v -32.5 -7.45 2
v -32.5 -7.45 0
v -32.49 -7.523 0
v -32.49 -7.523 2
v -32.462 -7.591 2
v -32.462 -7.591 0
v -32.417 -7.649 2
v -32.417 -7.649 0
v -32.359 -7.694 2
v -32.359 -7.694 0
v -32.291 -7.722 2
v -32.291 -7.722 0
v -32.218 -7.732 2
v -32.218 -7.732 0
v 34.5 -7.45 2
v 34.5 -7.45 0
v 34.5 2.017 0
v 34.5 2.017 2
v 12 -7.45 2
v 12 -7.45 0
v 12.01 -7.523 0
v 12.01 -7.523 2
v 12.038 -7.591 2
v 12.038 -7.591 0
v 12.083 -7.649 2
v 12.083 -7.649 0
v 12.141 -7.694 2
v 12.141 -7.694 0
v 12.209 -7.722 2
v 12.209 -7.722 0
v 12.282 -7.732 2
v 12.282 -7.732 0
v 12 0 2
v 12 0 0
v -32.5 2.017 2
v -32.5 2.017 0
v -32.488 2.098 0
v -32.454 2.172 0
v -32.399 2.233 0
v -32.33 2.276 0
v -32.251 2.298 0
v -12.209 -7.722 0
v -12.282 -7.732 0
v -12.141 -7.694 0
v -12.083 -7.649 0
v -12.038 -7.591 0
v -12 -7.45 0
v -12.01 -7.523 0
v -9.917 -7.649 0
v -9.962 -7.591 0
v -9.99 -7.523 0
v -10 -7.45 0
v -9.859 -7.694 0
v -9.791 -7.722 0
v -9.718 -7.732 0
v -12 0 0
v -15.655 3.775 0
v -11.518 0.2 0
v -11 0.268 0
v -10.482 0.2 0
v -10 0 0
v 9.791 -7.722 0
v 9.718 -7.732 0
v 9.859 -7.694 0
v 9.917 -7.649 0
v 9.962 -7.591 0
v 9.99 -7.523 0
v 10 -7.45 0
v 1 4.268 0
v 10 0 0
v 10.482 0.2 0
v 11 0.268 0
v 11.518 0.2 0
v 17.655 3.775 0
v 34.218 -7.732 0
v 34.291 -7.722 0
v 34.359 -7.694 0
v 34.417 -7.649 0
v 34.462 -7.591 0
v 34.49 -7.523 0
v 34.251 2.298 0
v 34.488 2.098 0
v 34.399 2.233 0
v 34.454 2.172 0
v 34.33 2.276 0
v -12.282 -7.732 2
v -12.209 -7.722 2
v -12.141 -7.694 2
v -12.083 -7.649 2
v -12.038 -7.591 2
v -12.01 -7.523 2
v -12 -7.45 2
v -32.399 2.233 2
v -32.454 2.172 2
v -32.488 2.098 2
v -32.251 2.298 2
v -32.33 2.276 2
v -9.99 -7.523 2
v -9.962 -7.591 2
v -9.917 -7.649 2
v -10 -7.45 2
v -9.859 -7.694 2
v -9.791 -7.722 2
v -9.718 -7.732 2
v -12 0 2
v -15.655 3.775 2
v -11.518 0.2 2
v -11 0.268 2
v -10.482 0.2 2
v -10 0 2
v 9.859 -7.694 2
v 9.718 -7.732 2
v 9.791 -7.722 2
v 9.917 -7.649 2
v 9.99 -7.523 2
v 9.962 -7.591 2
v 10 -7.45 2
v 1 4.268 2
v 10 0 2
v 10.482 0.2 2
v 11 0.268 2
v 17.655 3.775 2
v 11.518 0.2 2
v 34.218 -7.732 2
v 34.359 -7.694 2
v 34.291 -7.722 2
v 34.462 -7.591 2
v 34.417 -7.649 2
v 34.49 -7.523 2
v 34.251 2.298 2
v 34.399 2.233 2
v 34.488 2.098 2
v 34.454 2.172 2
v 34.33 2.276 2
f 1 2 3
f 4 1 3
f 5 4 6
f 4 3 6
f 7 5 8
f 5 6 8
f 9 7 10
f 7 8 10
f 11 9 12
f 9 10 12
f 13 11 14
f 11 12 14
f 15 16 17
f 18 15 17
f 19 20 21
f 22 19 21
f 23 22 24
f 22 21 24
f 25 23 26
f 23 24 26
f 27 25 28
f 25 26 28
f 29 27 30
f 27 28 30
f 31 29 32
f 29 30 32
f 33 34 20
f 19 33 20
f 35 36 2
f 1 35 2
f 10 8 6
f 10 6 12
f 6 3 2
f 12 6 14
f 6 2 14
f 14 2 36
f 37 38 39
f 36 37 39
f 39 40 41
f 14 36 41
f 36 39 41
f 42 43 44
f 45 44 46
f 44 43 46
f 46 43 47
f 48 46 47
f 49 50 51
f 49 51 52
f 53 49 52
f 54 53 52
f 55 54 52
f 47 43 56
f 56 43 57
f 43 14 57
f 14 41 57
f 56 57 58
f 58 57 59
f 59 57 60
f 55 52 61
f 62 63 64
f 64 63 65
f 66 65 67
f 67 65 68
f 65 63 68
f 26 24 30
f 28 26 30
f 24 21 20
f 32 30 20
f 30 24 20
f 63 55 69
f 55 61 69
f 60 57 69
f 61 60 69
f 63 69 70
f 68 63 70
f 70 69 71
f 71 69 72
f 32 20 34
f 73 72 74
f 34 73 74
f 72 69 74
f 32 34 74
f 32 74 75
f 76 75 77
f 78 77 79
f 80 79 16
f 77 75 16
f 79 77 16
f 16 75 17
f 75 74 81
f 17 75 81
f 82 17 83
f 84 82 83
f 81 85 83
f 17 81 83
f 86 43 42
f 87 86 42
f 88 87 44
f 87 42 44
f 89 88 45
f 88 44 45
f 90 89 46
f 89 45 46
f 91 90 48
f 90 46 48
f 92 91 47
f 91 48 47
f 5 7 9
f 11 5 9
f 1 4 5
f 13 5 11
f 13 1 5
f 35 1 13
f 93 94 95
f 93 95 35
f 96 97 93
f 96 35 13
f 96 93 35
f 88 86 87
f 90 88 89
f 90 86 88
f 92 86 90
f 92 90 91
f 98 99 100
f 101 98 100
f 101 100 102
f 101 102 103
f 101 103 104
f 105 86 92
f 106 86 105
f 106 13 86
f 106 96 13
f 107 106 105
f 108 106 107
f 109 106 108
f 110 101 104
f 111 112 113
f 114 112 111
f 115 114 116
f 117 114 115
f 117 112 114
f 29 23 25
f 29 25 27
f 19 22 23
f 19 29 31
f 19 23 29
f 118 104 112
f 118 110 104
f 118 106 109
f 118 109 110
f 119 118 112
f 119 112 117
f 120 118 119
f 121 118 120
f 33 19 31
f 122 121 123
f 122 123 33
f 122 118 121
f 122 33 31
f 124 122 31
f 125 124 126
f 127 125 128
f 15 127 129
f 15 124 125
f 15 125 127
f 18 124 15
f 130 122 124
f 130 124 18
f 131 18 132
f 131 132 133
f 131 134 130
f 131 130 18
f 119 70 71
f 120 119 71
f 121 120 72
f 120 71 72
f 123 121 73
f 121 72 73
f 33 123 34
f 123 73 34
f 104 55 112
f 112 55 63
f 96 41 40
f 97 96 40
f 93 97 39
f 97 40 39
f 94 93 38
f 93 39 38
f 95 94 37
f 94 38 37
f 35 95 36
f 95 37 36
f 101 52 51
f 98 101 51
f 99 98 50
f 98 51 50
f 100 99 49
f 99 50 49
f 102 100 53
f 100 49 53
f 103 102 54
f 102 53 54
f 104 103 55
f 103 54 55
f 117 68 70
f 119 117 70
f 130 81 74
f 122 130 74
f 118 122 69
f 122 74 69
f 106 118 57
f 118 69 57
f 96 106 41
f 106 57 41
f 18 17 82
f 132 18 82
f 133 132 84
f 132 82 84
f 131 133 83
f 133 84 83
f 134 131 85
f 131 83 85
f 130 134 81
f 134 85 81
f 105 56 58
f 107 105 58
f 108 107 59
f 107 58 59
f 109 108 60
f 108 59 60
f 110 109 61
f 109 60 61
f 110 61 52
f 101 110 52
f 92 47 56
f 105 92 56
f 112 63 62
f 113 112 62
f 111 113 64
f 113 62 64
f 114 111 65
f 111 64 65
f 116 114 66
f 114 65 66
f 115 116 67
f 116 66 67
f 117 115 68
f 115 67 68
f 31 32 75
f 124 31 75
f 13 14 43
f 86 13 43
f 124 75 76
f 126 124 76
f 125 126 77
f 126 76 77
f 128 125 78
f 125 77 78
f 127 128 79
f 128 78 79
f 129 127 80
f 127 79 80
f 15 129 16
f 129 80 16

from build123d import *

# Parameters (mm, degrees)
RESSALTO_EXTRUS_O1_DEPTH = 2


with BuildPart() as part:
    # Esboço1 → Ressalto-extrusão1 (new body)
    with BuildSketch(Plane.XY):
        with BuildLine():
            Line((-9.717847221, -7.732050808), (9.717847221, -7.732050808))
            ThreePointArc((9.717847221, -7.732050808), (9.917359364, -7.649410172), (10, -7.449898029))
            Line((10, -7.449898029), (10, 0))
            ThreePointArc((10, 0), (11, 0.267949192), (12, 0))
            Line((12, 0), (12, -7.449898029))
            ThreePointArc((12, -7.449898029), (12.082640636, -7.649410172), (12.282152779, -7.732050808))
            Line((12.282152779, -7.732050808), (34.217847221, -7.732050808))
            ThreePointArc((34.217847221, -7.732050808), (34.417359364, -7.649410172), (34.5, -7.449898029))
            Line((34.5, -7.449898029), (34.5, 2.017476071))
            ThreePointArc((34.5, 2.017476071), (34.428811399, 2.204837503), (34.251168098, 2.297654424))
            ThreePointArc((34.251168098, 2.297654424), (1, 4.267949192), (-32.251168098, 2.297654424))
            ThreePointArc((-32.251168098, 2.297654424), (-32.428811399, 2.204837503), (-32.5, 2.017476071))
            Line((-32.5, 2.017476071), (-32.5, -7.449898029))
            ThreePointArc((-32.5, -7.449898029), (-32.417359364, -7.649410172), (-32.217847221, -7.732050808))
            Line((-32.217847221, -7.732050808), (-12.282152779, -7.732050808))
            ThreePointArc((-12.282152779, -7.732050808), (-12.082640636, -7.649410172), (-12, -7.449898029))
            Line((-12, -7.449898029), (-12, 0))
            ThreePointArc((-12, 0), (-11, 0.267949192), (-10, 0))
            Line((-10, 0), (-10, -7.449898029))
            ThreePointArc((-10, -7.449898029), (-9.917359364, -7.649410172), (-9.717847221, -7.732050808))
        make_face()
    extrude(amount=RESSALTO_EXTRUS_O1_DEPTH)


solid = part.part
